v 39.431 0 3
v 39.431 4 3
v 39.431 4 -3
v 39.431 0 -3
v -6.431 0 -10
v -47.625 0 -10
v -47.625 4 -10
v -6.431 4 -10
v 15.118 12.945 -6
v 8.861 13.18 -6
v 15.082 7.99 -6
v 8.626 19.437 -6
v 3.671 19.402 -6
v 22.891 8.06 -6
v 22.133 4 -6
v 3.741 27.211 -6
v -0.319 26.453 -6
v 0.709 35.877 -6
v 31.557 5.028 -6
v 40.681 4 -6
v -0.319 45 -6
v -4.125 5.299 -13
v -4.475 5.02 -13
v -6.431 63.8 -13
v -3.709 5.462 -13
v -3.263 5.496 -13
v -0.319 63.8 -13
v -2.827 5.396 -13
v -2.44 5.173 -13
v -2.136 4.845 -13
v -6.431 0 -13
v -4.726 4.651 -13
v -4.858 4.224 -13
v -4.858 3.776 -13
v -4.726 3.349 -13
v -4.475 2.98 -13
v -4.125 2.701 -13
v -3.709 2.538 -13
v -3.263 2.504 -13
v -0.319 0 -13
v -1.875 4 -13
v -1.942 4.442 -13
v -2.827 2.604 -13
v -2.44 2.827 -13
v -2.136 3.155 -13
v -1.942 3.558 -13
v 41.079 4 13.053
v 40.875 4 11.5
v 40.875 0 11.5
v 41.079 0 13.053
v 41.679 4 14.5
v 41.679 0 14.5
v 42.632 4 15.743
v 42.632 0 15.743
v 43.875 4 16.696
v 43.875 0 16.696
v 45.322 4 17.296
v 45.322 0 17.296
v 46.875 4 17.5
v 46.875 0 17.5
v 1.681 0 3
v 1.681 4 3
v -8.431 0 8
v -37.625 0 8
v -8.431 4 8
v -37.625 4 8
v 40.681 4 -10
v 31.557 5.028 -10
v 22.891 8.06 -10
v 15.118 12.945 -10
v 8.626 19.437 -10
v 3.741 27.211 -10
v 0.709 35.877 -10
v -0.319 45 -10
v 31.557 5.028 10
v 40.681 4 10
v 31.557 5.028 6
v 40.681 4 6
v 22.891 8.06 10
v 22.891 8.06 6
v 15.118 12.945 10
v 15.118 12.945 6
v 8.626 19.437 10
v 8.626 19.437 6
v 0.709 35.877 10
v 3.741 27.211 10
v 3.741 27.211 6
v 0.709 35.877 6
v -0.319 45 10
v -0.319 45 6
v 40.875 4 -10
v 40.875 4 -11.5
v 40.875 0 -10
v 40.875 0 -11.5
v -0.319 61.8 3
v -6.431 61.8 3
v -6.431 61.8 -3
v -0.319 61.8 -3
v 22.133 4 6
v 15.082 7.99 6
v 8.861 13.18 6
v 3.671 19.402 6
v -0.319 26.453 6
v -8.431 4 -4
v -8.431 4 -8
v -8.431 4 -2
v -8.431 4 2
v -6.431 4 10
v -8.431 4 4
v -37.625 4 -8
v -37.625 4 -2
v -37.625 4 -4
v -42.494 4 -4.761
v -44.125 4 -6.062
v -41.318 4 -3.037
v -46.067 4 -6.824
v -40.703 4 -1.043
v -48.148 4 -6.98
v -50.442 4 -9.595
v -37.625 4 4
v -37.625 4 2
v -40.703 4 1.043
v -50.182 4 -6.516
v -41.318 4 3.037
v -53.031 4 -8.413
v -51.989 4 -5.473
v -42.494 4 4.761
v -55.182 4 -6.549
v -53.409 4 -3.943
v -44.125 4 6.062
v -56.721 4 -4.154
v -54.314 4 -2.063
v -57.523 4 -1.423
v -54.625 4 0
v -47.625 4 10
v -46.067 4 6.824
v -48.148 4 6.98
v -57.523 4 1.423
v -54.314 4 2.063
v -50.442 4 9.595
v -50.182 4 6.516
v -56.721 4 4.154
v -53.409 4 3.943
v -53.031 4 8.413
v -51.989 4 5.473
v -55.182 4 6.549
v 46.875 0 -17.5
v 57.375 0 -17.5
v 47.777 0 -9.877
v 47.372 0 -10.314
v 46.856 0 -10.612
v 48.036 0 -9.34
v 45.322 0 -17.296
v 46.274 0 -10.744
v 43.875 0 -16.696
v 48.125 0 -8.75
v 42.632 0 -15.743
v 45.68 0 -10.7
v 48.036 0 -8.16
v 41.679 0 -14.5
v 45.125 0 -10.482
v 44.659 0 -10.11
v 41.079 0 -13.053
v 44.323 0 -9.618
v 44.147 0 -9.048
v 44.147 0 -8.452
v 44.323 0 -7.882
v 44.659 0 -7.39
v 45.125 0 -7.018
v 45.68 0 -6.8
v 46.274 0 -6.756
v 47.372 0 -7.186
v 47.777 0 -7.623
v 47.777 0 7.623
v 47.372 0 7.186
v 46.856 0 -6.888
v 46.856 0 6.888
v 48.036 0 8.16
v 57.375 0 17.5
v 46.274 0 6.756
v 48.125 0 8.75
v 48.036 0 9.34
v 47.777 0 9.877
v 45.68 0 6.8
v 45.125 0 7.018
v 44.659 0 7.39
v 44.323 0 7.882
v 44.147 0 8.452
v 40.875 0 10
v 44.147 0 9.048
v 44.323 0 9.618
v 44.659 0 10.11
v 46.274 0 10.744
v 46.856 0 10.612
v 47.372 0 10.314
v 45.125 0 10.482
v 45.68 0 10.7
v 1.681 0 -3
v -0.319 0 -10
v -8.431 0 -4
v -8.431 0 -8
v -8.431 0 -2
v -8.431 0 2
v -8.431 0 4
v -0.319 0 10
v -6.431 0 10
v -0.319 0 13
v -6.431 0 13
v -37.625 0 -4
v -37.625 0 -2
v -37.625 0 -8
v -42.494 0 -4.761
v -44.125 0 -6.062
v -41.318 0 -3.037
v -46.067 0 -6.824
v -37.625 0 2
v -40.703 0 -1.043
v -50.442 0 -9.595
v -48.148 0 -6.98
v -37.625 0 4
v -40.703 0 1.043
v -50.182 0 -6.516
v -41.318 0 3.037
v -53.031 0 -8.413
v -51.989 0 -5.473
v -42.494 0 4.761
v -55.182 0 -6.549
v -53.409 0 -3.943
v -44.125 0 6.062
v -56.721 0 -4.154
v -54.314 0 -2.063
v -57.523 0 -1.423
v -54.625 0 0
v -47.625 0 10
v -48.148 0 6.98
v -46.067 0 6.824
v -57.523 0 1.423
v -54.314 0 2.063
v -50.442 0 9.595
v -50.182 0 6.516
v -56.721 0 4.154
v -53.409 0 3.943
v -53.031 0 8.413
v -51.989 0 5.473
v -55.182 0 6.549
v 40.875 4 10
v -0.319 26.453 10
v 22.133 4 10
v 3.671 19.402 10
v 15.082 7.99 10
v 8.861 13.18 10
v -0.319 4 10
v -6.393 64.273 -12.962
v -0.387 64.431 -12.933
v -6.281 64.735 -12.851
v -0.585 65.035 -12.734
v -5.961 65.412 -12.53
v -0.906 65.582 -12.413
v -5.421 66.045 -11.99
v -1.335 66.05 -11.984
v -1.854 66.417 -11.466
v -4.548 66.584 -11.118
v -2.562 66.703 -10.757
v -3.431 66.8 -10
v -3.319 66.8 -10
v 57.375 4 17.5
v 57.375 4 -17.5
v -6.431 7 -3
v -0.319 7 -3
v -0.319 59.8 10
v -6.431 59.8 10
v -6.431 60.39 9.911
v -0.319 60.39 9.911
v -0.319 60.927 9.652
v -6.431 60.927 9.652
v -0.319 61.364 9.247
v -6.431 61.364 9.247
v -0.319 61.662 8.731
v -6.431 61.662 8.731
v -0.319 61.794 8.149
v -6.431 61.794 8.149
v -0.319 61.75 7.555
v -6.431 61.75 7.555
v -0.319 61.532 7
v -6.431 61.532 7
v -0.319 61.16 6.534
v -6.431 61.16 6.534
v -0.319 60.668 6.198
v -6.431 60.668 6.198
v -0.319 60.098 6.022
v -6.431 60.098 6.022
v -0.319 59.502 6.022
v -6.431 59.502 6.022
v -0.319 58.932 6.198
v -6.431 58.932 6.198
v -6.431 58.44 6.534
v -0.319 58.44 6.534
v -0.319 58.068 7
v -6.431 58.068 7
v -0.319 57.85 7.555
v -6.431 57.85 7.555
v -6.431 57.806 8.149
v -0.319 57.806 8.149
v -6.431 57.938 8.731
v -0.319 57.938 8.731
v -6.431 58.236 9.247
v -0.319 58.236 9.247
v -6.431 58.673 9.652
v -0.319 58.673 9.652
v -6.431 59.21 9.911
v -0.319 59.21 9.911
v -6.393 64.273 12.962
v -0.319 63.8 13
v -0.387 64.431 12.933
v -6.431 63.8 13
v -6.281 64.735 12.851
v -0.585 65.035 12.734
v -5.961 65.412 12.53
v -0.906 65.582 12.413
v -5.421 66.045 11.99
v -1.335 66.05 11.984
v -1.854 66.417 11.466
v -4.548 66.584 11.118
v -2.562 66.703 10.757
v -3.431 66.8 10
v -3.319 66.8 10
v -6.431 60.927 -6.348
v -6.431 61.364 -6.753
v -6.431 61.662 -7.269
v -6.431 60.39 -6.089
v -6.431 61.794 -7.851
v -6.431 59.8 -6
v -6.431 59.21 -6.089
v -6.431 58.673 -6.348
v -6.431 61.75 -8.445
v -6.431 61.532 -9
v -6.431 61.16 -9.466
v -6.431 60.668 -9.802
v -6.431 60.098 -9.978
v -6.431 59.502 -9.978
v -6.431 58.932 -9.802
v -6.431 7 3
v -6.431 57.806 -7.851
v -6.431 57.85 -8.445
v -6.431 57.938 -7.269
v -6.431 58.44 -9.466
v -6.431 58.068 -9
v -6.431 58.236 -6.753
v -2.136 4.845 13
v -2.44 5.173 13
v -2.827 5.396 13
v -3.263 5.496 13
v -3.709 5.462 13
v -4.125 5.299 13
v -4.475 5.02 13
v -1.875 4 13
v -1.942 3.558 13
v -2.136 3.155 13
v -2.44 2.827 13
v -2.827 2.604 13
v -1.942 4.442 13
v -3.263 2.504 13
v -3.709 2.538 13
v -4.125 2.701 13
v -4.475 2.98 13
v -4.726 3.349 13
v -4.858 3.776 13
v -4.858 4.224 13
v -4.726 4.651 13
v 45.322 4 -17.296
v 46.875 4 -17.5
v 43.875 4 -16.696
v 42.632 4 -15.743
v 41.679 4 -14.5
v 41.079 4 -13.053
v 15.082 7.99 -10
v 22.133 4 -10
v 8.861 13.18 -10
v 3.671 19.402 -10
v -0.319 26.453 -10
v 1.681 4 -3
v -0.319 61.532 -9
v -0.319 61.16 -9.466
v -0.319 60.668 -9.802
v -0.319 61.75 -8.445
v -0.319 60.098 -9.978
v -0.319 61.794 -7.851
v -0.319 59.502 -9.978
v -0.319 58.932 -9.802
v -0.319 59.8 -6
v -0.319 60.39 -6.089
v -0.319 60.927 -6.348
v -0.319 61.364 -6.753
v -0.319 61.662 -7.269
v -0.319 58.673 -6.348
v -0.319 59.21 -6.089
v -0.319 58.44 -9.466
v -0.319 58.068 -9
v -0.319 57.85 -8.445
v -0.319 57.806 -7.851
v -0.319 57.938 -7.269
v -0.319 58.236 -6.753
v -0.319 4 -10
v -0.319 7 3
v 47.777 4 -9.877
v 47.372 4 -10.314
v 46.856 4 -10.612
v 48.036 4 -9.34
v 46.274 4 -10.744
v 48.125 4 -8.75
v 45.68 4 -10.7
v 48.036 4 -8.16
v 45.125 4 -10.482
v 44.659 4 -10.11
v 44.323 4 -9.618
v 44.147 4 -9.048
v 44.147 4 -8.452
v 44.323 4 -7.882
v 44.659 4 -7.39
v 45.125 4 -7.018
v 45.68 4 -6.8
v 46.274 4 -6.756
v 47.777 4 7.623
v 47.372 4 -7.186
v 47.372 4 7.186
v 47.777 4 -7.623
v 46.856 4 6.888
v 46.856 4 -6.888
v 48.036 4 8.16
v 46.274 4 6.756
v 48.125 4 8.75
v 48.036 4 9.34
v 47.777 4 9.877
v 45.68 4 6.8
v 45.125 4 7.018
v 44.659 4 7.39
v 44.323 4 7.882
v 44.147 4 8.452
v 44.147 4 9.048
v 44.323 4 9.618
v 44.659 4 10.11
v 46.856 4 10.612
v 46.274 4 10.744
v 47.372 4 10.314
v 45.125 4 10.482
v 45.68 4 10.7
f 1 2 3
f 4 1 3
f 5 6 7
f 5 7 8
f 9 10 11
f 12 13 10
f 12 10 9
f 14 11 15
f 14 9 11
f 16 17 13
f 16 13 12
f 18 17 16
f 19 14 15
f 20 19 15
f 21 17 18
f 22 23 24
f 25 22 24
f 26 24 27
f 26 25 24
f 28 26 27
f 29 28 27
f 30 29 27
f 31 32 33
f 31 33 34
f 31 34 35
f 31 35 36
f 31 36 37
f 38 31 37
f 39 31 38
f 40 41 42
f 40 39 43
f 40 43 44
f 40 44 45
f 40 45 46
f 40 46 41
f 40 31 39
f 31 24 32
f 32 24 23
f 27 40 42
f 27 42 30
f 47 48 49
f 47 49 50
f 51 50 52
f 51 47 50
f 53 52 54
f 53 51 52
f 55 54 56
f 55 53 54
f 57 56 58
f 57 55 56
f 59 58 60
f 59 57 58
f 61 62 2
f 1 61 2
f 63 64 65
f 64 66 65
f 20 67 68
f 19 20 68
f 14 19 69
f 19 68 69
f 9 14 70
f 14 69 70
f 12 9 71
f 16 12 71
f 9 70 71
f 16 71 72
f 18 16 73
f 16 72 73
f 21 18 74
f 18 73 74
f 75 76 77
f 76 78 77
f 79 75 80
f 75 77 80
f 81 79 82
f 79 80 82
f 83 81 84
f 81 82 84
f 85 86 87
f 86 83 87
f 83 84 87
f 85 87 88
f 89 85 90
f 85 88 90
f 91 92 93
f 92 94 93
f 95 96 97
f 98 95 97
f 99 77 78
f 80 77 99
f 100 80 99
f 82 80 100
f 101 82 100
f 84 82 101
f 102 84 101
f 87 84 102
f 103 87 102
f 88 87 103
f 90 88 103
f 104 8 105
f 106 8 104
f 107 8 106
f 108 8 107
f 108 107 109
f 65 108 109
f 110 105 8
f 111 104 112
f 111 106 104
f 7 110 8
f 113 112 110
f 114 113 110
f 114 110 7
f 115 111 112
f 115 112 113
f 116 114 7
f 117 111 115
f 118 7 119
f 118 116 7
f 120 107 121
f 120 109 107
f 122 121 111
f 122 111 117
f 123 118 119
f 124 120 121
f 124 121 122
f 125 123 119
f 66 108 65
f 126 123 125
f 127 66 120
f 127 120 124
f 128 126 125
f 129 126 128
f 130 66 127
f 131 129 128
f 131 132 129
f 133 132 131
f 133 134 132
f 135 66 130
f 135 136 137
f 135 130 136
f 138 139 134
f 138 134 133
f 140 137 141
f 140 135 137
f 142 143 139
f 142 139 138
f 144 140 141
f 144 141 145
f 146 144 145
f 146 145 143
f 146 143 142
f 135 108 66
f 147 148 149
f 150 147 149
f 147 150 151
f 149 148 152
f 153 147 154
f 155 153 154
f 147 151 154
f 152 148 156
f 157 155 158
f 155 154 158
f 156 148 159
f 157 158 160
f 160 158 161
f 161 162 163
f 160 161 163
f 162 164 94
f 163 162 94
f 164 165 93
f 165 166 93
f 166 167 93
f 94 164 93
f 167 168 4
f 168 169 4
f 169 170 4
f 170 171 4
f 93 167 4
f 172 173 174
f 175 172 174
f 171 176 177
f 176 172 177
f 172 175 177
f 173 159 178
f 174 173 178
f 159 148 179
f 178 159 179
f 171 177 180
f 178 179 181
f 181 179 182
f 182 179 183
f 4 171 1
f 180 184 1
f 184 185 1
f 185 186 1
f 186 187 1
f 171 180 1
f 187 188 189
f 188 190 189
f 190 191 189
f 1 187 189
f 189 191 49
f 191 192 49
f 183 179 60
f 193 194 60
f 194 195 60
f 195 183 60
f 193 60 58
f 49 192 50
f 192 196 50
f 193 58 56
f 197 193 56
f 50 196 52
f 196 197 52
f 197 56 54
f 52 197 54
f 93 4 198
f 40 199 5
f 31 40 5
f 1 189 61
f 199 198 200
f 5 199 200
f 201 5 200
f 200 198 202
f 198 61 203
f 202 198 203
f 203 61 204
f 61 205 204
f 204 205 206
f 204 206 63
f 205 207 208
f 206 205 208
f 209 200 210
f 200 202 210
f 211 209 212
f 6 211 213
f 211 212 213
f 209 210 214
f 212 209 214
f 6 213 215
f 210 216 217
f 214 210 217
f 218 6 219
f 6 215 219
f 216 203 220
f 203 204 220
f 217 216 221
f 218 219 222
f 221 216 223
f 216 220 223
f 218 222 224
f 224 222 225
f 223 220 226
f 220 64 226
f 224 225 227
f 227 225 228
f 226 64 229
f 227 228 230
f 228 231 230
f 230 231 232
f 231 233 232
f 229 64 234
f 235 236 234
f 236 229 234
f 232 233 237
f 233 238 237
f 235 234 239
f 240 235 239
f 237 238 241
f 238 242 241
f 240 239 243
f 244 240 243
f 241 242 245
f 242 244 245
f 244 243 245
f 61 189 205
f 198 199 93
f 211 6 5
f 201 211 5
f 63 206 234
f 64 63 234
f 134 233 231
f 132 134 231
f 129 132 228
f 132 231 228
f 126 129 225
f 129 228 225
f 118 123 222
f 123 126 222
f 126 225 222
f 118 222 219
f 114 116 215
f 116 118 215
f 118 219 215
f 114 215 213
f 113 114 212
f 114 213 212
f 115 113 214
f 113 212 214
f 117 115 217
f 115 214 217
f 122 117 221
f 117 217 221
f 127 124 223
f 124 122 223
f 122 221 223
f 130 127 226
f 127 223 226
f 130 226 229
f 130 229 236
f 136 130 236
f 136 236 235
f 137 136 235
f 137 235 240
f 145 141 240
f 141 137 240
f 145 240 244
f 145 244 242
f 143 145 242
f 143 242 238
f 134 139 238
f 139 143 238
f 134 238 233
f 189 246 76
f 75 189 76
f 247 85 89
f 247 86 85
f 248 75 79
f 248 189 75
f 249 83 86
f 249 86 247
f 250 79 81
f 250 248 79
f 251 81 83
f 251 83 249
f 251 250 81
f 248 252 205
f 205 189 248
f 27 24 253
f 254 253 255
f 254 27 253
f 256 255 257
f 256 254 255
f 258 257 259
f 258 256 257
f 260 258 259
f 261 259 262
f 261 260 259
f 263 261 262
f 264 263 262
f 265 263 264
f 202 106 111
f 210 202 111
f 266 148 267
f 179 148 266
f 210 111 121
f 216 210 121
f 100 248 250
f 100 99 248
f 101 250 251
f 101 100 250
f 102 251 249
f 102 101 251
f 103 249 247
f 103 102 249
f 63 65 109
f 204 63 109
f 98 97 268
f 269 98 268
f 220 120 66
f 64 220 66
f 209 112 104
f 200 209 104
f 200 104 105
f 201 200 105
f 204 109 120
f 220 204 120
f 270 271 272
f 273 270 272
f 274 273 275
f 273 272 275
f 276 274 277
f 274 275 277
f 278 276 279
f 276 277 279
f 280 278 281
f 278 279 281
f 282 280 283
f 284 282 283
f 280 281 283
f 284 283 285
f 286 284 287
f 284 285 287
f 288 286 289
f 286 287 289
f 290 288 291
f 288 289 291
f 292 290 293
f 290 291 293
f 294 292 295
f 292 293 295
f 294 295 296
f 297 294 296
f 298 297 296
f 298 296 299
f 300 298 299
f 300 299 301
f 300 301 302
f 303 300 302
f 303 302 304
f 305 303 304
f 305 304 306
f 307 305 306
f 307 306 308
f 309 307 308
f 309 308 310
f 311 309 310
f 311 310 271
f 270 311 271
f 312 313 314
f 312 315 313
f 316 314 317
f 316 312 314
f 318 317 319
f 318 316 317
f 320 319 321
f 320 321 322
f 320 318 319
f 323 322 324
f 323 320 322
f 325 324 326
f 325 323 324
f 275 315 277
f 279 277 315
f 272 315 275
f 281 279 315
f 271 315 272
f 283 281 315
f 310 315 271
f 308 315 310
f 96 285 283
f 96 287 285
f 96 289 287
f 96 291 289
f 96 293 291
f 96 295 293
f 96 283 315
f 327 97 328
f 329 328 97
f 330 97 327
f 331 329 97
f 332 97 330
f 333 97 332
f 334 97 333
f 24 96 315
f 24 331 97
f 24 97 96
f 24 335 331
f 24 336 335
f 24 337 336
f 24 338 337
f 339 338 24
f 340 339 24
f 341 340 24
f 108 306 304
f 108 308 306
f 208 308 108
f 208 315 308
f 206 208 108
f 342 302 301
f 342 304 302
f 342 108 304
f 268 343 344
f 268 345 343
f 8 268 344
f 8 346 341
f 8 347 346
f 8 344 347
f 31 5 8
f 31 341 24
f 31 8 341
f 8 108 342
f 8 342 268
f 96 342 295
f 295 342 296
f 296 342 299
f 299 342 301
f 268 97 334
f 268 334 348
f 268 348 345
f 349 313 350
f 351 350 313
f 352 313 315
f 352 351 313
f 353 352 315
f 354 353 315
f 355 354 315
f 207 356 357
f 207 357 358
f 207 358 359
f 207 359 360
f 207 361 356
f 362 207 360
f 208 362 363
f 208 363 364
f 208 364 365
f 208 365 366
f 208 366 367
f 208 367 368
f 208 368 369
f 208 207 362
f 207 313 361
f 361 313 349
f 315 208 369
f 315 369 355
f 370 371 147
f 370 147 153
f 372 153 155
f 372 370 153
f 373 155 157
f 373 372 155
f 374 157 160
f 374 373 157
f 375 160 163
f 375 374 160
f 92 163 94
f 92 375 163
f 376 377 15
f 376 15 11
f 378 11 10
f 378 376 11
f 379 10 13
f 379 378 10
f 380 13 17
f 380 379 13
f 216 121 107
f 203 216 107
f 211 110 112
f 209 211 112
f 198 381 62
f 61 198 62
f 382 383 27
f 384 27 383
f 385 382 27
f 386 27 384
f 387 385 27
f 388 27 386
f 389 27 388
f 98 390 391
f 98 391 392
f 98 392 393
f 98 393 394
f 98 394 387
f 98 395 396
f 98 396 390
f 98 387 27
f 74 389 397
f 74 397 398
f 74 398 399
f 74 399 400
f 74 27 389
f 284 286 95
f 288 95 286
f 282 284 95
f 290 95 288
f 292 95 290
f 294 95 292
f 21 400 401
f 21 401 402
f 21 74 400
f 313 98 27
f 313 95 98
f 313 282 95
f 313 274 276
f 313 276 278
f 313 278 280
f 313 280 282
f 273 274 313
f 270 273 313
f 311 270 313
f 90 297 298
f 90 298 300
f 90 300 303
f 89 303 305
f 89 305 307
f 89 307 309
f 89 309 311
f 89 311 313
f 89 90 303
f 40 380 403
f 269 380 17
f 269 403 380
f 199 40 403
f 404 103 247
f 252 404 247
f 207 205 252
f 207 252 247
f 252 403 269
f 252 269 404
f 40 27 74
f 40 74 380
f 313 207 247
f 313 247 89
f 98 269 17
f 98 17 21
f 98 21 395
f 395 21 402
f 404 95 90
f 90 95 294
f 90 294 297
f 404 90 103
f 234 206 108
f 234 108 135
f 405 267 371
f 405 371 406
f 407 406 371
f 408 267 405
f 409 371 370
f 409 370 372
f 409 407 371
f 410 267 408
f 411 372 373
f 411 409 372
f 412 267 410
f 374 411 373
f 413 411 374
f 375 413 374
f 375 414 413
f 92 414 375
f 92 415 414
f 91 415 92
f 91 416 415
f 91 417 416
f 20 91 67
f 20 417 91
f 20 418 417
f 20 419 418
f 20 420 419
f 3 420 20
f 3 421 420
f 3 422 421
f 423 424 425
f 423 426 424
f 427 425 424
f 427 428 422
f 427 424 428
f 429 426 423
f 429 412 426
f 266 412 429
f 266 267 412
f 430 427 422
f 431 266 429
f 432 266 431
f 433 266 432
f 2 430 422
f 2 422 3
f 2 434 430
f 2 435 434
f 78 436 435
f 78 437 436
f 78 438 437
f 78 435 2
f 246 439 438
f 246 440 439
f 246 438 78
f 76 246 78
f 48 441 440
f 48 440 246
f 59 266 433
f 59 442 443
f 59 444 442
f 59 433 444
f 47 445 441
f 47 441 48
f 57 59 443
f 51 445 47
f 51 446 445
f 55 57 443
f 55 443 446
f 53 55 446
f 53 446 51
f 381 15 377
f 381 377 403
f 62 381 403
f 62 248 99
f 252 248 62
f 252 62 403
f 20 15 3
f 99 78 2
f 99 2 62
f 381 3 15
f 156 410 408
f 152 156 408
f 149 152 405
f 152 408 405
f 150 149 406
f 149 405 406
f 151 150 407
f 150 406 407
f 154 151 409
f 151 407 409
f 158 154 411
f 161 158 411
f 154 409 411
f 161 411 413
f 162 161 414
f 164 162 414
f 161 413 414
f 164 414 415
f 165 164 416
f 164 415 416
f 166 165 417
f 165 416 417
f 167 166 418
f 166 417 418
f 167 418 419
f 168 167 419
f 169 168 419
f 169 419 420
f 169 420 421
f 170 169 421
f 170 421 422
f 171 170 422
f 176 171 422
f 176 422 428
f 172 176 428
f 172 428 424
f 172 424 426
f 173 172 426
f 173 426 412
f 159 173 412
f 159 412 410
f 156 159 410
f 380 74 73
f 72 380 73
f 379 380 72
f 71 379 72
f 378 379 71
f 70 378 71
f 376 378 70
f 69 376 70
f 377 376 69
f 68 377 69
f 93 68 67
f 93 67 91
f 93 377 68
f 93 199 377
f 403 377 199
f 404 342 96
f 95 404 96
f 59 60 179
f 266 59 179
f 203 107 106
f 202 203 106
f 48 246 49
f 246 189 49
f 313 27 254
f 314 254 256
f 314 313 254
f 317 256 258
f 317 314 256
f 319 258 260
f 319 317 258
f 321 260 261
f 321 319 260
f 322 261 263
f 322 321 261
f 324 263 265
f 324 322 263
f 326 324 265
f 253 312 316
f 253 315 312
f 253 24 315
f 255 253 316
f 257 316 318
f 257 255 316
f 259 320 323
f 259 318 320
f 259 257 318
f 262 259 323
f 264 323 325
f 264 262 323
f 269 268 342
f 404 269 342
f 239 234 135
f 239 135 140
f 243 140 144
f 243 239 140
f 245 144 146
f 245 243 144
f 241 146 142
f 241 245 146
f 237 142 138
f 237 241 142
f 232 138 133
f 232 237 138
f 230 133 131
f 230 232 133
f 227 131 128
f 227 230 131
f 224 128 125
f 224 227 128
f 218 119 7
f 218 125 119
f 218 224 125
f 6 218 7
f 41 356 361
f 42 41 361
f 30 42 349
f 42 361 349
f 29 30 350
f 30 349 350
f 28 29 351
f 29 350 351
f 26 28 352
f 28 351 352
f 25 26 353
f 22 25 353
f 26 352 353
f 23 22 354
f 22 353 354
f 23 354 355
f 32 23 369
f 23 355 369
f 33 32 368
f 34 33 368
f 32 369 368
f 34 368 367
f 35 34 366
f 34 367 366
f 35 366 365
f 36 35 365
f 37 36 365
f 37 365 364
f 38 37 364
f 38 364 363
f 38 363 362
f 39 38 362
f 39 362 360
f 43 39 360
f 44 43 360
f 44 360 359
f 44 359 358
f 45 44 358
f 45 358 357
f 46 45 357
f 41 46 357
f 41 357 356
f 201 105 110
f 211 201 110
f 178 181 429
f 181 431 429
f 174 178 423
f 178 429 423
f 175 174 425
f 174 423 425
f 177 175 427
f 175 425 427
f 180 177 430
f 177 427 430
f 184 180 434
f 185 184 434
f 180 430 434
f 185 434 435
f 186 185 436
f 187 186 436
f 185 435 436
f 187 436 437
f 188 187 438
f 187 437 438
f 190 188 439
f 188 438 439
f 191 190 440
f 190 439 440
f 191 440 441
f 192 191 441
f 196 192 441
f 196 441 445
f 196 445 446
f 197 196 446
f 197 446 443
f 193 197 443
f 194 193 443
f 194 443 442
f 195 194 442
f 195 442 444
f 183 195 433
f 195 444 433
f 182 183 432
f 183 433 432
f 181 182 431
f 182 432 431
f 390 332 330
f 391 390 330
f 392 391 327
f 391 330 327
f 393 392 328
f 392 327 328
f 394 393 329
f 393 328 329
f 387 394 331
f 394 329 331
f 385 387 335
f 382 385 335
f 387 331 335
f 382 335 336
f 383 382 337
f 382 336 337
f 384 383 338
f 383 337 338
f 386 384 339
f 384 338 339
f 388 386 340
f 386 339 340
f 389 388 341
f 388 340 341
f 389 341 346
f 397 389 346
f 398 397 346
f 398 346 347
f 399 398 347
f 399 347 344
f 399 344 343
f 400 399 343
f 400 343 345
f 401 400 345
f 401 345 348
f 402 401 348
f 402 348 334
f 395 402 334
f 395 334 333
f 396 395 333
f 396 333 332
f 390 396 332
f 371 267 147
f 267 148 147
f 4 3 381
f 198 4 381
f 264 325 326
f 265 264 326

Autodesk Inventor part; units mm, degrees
ref_plane "YZ Plane" through (0, 0, 0) normal (1, 0, 0) x (0, 1, 0)
ref_plane "XZ Plane" through (0, 0, 0) normal (0, 1, 0) x (-1, 0, 0)
sketch "Main Sketch" plane through (0, 0, 0) normal (0, 1, 0) x (-1, 0, 0)
  line L0 (-57.375, -12.0472) -> (-57.375, 12.0472)
  line L1 (-57.375, 12.0472) -> (47.625, -10) construction
  line L2 (47.625, 10) -> (-57.375, -12.0472) construction
  circle A0 centre (47.625, 0) radius 7
  arc A1 (47.625, -10) -> (47.625, 10) centre (47.625, 0) ccw
  line L3 (-40.875, 17.5) -> (-57.375, 17.5)
  line L4 (-57.375, 17.5) -> (-57.375, -17.5)
  line L5 (-57.375, -17.5) -> (-40.875, -17.5)
  line L6 (-40.875, 17.5) -> (-57.375, -17.5) construction
  line L7 (-57.375, 17.5) -> (-40.875, -17.5) construction
  line L8 (47.625, -10) -> (-40.875, -10)
  line L9 (-40.875, -17.5) -> (-40.875, -10)
  line L10 (-40.875, 10) -> (-40.875, 17.5)
  line L11 (-40.875, 10) -> (47.625, 10)
  point P0 (0, 0)
  point P1 (-49.125, 0)
  dimension "d3" = 14
  dimension "d4" = 105
  dimension "d13" = 16.5
  dimension "d14" = 35
  dimension "d15" = 0
  dimension "d18" = 20
extrude "Main Extrusion" add sketch "Main Sketch" along normal blind 4
sketch "Screw Holes Sketch" plane through (0, 4, 0) normal (0, 1, 0) x (1, 0, 0)
  circle A0 centre (46.125, -8.75) radius 2
  line L0 (57.375, 17.5) -> (40.875, 17.5) projected
  line L1 (40.875, -17.5) -> (57.375, -17.5) projected
  line L2 (35.2664, 0) -> (65.7891, 0)
  line L3 (51.375, -27.0398) -> (51.375, 30.2346) construction
  line L4 (57.375, -17.5) -> (57.375, 17.5) projected
  line L5 (40.875, -10) -> (40.875, -17.5) projected
  circle A1 centre (46.125, 8.75) radius 2
  line L6 (51.375, 27.0398) -> (51.375, -30.2346) construction
  point P0 (0, 0)
  dimension "d21" = 4
  dimension "d22" = 35
  dimension "d23" = 6
  dimension "d24" = 5.25
  dimension "d25" = 5.25
  dimension "d26" = 10.5
  dimension "d27" = 8.75
  dimension "d28" = 17.5
extrude "Screw Holes Cut" cut sketch "Screw Holes Sketch" against normal through all
fillet "Smoooooooooooooooooth" radius 6 2 edges at (40.875, 2, -17.5) (40.875, 2, 17.5)
sketch "Side Axel Hole Sketch" plane through (-47.625, 0, 10) normal (0, 0, 1) x (1, 0, 0)
  line L0 (88.5, 4) -> (88.5, 0) projected
  line L1 (0, 0) -> (0, 4) projected
  line L2 (44.25, -12.0383) -> (44.25, 22.7681) construction
  line L3 (88.5, 0) -> (0, 0) projected
  line L4 (0, 4) -> (88.5, 4) projected
  circle A0 centre (44.25, 4) radius 1.5
  point P0 (47.625, 0)
  dimension "d32" = 88.5
  dimension "d33" = 44.25
  dimension "d34" = 44.25
  dimension "d35" = 4
  dimension "d41" = 3
sketch "Sketch7" plane through (0, 4, 0) normal (0, 1, 0) x (1, 0, 0)
  line L0 (-47.625, -10) -> (40.875, -10) construction
  line L1 (-3.375, -10) -> (-3.375, 33.3565) construction
  line L2 (-0.3194, -13) -> (-6.4306, -13)
  line L3 (-6.4306, -13) -> (-6.4306, 13)
  line L4 (-6.4306, 13) -> (-0.3194, 13)
  line L5 (-0.3194, 13) -> (-0.3194, -13)
  line L6 (-0.3194, -13) -> (-6.4306, 13) construction
  line L7 (-6.4306, -13) -> (-0.3194, 13) construction
  point P0 (0, 0)
  point P1 (-3.375, 0)
  dimension "d47" = 26
extrude "Servo Mount Extrusion" add sketch "Sketch7" along normal blind 62.8 and the other way blind 4
extrude "Side Axel Cut" cut sketch "Side Axel Hole Sketch" along normal through all both and the other way through all contours A0 L4 | L4 A0
sketch "Sketch8" plane through (-6.4306, 4, -10) normal (-1, 0, 0) x (0, 0, 1)
  line L0 (23, 62.8) -> (23, -4) construction
  line L1 (-3, 62.8) -> (23, 62.8) construction
  line L2 (-3, 62.8) -> (-3, -4) construction
  circle A0 centre (2, 55.8) radius 2
  circle A1 centre (18, 55.8) radius 2
  point P0 (10, -4)
  dimension "d54" = 4
  dimension "d55" = 4
  dimension "d56" = 16
  dimension "d57" = 7
  dimension "d58" = 7
  dimension "d59" = 5
  dimension "d60" = 5
extrude "Mount Holes Cut" cut sketch "Sketch8" against normal through all
fillet "Support" radius 41 1 edges at (-0.3194, 4, 0)
fillet "lil hat" radius 3 4 edges at (-0.3194, 66.8, 0) (-3.375, 66.8, -13) (-6.4306, 66.8, 0) (-3.375, 66.8, 13)
ref_plane "Lifted XZ Plane" through (0, 45, 0) normal (0, -1, 0) x (1, 0, 0)
sketch "Support Center Sketch" plane through (0, 45, 0) normal (0, -1, 0) x (1, 0, 0)
  line L0 (40.6806, 10) -> (40.6806, -10) projected
  line L1 (-0.3194, -6) -> (40.6806, -6)
  line L2 (40.6806, -6) -> (40.6806, 6)
  line L3 (40.6806, 6) -> (-0.3194, 6)
  line L4 (-0.3194, 6) -> (-0.3194, -6)
  line L5 (-0.3194, -10) -> (40.6806, -10) projected
  line L6 (40.6806, 10) -> (-0.3194, 10) projected
  point P0 (0, 0)
  dimension "d66" = 41
  dimension "d67" = 4
  dimension "d68" = 4
  dimension "d69" = 12
extrude "Support Center Cut" cut sketch "Support Center Sketch" along normal blind 41
sketch "Support Side Cut Sketch" plane through (40.875, 0, -10) normal (0, 0, -1) x (-1, 0, 0)
  arc A0 (0.1944, 4) -> (41.1944, 45) centre (0.1944, 45) ccw construction
  arc A1 (0.1944, 4) -> (41.1944, 45) centre (0.1944, 45) ccw projected
  arc A2 (18.7416, 4) -> (41.1944, 26.4528) centre (0.1944, 45) ccw
  line L0 (-6, 4) -> (0, 4) projected
  line L1 (41.1944, 0) -> (41.1944, 45) projected
  line L2 (41.1944, 0) -> (0, 0) projected
  line L3 (41.1944, 26.4528) -> (41.1944, 4)
  line L4 (0, 4) -> (0.1944, 4)
  line L5 (18.7416, 4) -> (41.1944, 4)
  point P0 (40.875, 0)
  dimension "d72" = 41
  dimension "d73" = 45
  dimension "d75" = 4
extrude "Support Side Cut" cut sketch "Support Side Cut Sketch" against normal through all
sketch "Body Holes Sketch" plane through (0, 4, 0) normal (0, 1, 0) x (1, 0, 0)
  line L0 (-37.625, 4) -> (-8.4306, 4)
  line L1 (-8.4306, 4) -> (-8.4306, 8)
  line L2 (-8.4306, 8) -> (-37.625, 8)
  line L3 (-37.625, 8) -> (-37.625, 4)
  line L4 (-6.4306, 10) -> (-47.625, 10) projected
  line L5 (-6.4306, -10) -> (-6.4306, 10) projected
  line L6 (-47.625, -13.767) -> (-47.625, 22.327) construction
  line L7 (-37.625, -2) -> (-8.4306, -2)
  line L8 (-8.4306, -2) -> (-8.4306, 2)
  line L9 (-8.4306, 2) -> (-37.625, 2)
  line L10 (-37.625, 2) -> (-37.625, -2)
  line L11 (-37.625, -8) -> (-8.4306, -8)
  line L12 (-8.4306, -8) -> (-8.4306, -4)
  line L13 (-8.4306, -4) -> (-37.625, -4)
  line L14 (-37.625, -4) -> (-37.625, -8)
  line L15 (-47.625, -10) -> (-6.4306, -10) projected
  line L16 (39.4306, 3) -> (1.6806, 3)
  line L17 (1.6806, 3) -> (1.6806, -3)
  line L18 (1.6806, -3) -> (39.4306, -3)
  line L19 (39.4306, -3) -> (39.4306, 3)
  line L20 (40.6806, -6) -> (-0.3194, -6) projected
  line L21 (-0.3194, 6) -> (40.6806, 6) projected
  line L22 (-0.3194, 10) -> (-0.3194, -10) projected
  line L23 (40.6806, 6) -> (40.6806, 10) projected
  point P0 (0, 0)
  dimension "d78" = 2
  dimension "d79" = 2
  dimension "d80" = 10
  dimension "d81" = 4
  dimension "d84" = 6
  dimension "d89" = 2
  dimension "d90" = 6
  dimension "d91" = 3
  dimension "d92" = 3
  dimension "d93" = 2
  dimension "d94" = 1.25
extrude "Swiss-ified" cut sketch "Body Holes Sketch" against normal through all
sketch "Mount Hole Sketch" plane through (-6.4306, 4, -10) normal (-1, 0, 0) x (0, 0, 1)
  line L0 (4, 81.3032) -> (4, -34.1238) construction
  line L1 (16, 81.3032) -> (16, -34.1238) construction
  line L2 (7, 3) -> (13, 3)
  line L3 (13, 3) -> (13, 57.8)
  line L4 (13, 57.8) -> (7, 57.8)
  line L5 (7, 57.8) -> (7, 3)
  line L6 (-3, 59.8) -> (-3, -4) projected
  line L7 (23, 59.8) -> (23, -4) projected
  line L8 (20, 0) -> (0, 0) projected
  line L9 (-3, 59.8) -> (23, 59.8) projected
  point P0 (10, -4)
  dimension "d97" = 6
  dimension "d98" = 7
  dimension "d99" = 7
  dimension "d100" = 12
  dimension "d101" = 3
  dimension "d102" = 3
  dimension "d103" = 3
  dimension "d104" = 2
extrude "Swissified" cut sketch "Mount Hole Sketch" against normal through all
properties part number "TapeMeasureBracketSideServo"
